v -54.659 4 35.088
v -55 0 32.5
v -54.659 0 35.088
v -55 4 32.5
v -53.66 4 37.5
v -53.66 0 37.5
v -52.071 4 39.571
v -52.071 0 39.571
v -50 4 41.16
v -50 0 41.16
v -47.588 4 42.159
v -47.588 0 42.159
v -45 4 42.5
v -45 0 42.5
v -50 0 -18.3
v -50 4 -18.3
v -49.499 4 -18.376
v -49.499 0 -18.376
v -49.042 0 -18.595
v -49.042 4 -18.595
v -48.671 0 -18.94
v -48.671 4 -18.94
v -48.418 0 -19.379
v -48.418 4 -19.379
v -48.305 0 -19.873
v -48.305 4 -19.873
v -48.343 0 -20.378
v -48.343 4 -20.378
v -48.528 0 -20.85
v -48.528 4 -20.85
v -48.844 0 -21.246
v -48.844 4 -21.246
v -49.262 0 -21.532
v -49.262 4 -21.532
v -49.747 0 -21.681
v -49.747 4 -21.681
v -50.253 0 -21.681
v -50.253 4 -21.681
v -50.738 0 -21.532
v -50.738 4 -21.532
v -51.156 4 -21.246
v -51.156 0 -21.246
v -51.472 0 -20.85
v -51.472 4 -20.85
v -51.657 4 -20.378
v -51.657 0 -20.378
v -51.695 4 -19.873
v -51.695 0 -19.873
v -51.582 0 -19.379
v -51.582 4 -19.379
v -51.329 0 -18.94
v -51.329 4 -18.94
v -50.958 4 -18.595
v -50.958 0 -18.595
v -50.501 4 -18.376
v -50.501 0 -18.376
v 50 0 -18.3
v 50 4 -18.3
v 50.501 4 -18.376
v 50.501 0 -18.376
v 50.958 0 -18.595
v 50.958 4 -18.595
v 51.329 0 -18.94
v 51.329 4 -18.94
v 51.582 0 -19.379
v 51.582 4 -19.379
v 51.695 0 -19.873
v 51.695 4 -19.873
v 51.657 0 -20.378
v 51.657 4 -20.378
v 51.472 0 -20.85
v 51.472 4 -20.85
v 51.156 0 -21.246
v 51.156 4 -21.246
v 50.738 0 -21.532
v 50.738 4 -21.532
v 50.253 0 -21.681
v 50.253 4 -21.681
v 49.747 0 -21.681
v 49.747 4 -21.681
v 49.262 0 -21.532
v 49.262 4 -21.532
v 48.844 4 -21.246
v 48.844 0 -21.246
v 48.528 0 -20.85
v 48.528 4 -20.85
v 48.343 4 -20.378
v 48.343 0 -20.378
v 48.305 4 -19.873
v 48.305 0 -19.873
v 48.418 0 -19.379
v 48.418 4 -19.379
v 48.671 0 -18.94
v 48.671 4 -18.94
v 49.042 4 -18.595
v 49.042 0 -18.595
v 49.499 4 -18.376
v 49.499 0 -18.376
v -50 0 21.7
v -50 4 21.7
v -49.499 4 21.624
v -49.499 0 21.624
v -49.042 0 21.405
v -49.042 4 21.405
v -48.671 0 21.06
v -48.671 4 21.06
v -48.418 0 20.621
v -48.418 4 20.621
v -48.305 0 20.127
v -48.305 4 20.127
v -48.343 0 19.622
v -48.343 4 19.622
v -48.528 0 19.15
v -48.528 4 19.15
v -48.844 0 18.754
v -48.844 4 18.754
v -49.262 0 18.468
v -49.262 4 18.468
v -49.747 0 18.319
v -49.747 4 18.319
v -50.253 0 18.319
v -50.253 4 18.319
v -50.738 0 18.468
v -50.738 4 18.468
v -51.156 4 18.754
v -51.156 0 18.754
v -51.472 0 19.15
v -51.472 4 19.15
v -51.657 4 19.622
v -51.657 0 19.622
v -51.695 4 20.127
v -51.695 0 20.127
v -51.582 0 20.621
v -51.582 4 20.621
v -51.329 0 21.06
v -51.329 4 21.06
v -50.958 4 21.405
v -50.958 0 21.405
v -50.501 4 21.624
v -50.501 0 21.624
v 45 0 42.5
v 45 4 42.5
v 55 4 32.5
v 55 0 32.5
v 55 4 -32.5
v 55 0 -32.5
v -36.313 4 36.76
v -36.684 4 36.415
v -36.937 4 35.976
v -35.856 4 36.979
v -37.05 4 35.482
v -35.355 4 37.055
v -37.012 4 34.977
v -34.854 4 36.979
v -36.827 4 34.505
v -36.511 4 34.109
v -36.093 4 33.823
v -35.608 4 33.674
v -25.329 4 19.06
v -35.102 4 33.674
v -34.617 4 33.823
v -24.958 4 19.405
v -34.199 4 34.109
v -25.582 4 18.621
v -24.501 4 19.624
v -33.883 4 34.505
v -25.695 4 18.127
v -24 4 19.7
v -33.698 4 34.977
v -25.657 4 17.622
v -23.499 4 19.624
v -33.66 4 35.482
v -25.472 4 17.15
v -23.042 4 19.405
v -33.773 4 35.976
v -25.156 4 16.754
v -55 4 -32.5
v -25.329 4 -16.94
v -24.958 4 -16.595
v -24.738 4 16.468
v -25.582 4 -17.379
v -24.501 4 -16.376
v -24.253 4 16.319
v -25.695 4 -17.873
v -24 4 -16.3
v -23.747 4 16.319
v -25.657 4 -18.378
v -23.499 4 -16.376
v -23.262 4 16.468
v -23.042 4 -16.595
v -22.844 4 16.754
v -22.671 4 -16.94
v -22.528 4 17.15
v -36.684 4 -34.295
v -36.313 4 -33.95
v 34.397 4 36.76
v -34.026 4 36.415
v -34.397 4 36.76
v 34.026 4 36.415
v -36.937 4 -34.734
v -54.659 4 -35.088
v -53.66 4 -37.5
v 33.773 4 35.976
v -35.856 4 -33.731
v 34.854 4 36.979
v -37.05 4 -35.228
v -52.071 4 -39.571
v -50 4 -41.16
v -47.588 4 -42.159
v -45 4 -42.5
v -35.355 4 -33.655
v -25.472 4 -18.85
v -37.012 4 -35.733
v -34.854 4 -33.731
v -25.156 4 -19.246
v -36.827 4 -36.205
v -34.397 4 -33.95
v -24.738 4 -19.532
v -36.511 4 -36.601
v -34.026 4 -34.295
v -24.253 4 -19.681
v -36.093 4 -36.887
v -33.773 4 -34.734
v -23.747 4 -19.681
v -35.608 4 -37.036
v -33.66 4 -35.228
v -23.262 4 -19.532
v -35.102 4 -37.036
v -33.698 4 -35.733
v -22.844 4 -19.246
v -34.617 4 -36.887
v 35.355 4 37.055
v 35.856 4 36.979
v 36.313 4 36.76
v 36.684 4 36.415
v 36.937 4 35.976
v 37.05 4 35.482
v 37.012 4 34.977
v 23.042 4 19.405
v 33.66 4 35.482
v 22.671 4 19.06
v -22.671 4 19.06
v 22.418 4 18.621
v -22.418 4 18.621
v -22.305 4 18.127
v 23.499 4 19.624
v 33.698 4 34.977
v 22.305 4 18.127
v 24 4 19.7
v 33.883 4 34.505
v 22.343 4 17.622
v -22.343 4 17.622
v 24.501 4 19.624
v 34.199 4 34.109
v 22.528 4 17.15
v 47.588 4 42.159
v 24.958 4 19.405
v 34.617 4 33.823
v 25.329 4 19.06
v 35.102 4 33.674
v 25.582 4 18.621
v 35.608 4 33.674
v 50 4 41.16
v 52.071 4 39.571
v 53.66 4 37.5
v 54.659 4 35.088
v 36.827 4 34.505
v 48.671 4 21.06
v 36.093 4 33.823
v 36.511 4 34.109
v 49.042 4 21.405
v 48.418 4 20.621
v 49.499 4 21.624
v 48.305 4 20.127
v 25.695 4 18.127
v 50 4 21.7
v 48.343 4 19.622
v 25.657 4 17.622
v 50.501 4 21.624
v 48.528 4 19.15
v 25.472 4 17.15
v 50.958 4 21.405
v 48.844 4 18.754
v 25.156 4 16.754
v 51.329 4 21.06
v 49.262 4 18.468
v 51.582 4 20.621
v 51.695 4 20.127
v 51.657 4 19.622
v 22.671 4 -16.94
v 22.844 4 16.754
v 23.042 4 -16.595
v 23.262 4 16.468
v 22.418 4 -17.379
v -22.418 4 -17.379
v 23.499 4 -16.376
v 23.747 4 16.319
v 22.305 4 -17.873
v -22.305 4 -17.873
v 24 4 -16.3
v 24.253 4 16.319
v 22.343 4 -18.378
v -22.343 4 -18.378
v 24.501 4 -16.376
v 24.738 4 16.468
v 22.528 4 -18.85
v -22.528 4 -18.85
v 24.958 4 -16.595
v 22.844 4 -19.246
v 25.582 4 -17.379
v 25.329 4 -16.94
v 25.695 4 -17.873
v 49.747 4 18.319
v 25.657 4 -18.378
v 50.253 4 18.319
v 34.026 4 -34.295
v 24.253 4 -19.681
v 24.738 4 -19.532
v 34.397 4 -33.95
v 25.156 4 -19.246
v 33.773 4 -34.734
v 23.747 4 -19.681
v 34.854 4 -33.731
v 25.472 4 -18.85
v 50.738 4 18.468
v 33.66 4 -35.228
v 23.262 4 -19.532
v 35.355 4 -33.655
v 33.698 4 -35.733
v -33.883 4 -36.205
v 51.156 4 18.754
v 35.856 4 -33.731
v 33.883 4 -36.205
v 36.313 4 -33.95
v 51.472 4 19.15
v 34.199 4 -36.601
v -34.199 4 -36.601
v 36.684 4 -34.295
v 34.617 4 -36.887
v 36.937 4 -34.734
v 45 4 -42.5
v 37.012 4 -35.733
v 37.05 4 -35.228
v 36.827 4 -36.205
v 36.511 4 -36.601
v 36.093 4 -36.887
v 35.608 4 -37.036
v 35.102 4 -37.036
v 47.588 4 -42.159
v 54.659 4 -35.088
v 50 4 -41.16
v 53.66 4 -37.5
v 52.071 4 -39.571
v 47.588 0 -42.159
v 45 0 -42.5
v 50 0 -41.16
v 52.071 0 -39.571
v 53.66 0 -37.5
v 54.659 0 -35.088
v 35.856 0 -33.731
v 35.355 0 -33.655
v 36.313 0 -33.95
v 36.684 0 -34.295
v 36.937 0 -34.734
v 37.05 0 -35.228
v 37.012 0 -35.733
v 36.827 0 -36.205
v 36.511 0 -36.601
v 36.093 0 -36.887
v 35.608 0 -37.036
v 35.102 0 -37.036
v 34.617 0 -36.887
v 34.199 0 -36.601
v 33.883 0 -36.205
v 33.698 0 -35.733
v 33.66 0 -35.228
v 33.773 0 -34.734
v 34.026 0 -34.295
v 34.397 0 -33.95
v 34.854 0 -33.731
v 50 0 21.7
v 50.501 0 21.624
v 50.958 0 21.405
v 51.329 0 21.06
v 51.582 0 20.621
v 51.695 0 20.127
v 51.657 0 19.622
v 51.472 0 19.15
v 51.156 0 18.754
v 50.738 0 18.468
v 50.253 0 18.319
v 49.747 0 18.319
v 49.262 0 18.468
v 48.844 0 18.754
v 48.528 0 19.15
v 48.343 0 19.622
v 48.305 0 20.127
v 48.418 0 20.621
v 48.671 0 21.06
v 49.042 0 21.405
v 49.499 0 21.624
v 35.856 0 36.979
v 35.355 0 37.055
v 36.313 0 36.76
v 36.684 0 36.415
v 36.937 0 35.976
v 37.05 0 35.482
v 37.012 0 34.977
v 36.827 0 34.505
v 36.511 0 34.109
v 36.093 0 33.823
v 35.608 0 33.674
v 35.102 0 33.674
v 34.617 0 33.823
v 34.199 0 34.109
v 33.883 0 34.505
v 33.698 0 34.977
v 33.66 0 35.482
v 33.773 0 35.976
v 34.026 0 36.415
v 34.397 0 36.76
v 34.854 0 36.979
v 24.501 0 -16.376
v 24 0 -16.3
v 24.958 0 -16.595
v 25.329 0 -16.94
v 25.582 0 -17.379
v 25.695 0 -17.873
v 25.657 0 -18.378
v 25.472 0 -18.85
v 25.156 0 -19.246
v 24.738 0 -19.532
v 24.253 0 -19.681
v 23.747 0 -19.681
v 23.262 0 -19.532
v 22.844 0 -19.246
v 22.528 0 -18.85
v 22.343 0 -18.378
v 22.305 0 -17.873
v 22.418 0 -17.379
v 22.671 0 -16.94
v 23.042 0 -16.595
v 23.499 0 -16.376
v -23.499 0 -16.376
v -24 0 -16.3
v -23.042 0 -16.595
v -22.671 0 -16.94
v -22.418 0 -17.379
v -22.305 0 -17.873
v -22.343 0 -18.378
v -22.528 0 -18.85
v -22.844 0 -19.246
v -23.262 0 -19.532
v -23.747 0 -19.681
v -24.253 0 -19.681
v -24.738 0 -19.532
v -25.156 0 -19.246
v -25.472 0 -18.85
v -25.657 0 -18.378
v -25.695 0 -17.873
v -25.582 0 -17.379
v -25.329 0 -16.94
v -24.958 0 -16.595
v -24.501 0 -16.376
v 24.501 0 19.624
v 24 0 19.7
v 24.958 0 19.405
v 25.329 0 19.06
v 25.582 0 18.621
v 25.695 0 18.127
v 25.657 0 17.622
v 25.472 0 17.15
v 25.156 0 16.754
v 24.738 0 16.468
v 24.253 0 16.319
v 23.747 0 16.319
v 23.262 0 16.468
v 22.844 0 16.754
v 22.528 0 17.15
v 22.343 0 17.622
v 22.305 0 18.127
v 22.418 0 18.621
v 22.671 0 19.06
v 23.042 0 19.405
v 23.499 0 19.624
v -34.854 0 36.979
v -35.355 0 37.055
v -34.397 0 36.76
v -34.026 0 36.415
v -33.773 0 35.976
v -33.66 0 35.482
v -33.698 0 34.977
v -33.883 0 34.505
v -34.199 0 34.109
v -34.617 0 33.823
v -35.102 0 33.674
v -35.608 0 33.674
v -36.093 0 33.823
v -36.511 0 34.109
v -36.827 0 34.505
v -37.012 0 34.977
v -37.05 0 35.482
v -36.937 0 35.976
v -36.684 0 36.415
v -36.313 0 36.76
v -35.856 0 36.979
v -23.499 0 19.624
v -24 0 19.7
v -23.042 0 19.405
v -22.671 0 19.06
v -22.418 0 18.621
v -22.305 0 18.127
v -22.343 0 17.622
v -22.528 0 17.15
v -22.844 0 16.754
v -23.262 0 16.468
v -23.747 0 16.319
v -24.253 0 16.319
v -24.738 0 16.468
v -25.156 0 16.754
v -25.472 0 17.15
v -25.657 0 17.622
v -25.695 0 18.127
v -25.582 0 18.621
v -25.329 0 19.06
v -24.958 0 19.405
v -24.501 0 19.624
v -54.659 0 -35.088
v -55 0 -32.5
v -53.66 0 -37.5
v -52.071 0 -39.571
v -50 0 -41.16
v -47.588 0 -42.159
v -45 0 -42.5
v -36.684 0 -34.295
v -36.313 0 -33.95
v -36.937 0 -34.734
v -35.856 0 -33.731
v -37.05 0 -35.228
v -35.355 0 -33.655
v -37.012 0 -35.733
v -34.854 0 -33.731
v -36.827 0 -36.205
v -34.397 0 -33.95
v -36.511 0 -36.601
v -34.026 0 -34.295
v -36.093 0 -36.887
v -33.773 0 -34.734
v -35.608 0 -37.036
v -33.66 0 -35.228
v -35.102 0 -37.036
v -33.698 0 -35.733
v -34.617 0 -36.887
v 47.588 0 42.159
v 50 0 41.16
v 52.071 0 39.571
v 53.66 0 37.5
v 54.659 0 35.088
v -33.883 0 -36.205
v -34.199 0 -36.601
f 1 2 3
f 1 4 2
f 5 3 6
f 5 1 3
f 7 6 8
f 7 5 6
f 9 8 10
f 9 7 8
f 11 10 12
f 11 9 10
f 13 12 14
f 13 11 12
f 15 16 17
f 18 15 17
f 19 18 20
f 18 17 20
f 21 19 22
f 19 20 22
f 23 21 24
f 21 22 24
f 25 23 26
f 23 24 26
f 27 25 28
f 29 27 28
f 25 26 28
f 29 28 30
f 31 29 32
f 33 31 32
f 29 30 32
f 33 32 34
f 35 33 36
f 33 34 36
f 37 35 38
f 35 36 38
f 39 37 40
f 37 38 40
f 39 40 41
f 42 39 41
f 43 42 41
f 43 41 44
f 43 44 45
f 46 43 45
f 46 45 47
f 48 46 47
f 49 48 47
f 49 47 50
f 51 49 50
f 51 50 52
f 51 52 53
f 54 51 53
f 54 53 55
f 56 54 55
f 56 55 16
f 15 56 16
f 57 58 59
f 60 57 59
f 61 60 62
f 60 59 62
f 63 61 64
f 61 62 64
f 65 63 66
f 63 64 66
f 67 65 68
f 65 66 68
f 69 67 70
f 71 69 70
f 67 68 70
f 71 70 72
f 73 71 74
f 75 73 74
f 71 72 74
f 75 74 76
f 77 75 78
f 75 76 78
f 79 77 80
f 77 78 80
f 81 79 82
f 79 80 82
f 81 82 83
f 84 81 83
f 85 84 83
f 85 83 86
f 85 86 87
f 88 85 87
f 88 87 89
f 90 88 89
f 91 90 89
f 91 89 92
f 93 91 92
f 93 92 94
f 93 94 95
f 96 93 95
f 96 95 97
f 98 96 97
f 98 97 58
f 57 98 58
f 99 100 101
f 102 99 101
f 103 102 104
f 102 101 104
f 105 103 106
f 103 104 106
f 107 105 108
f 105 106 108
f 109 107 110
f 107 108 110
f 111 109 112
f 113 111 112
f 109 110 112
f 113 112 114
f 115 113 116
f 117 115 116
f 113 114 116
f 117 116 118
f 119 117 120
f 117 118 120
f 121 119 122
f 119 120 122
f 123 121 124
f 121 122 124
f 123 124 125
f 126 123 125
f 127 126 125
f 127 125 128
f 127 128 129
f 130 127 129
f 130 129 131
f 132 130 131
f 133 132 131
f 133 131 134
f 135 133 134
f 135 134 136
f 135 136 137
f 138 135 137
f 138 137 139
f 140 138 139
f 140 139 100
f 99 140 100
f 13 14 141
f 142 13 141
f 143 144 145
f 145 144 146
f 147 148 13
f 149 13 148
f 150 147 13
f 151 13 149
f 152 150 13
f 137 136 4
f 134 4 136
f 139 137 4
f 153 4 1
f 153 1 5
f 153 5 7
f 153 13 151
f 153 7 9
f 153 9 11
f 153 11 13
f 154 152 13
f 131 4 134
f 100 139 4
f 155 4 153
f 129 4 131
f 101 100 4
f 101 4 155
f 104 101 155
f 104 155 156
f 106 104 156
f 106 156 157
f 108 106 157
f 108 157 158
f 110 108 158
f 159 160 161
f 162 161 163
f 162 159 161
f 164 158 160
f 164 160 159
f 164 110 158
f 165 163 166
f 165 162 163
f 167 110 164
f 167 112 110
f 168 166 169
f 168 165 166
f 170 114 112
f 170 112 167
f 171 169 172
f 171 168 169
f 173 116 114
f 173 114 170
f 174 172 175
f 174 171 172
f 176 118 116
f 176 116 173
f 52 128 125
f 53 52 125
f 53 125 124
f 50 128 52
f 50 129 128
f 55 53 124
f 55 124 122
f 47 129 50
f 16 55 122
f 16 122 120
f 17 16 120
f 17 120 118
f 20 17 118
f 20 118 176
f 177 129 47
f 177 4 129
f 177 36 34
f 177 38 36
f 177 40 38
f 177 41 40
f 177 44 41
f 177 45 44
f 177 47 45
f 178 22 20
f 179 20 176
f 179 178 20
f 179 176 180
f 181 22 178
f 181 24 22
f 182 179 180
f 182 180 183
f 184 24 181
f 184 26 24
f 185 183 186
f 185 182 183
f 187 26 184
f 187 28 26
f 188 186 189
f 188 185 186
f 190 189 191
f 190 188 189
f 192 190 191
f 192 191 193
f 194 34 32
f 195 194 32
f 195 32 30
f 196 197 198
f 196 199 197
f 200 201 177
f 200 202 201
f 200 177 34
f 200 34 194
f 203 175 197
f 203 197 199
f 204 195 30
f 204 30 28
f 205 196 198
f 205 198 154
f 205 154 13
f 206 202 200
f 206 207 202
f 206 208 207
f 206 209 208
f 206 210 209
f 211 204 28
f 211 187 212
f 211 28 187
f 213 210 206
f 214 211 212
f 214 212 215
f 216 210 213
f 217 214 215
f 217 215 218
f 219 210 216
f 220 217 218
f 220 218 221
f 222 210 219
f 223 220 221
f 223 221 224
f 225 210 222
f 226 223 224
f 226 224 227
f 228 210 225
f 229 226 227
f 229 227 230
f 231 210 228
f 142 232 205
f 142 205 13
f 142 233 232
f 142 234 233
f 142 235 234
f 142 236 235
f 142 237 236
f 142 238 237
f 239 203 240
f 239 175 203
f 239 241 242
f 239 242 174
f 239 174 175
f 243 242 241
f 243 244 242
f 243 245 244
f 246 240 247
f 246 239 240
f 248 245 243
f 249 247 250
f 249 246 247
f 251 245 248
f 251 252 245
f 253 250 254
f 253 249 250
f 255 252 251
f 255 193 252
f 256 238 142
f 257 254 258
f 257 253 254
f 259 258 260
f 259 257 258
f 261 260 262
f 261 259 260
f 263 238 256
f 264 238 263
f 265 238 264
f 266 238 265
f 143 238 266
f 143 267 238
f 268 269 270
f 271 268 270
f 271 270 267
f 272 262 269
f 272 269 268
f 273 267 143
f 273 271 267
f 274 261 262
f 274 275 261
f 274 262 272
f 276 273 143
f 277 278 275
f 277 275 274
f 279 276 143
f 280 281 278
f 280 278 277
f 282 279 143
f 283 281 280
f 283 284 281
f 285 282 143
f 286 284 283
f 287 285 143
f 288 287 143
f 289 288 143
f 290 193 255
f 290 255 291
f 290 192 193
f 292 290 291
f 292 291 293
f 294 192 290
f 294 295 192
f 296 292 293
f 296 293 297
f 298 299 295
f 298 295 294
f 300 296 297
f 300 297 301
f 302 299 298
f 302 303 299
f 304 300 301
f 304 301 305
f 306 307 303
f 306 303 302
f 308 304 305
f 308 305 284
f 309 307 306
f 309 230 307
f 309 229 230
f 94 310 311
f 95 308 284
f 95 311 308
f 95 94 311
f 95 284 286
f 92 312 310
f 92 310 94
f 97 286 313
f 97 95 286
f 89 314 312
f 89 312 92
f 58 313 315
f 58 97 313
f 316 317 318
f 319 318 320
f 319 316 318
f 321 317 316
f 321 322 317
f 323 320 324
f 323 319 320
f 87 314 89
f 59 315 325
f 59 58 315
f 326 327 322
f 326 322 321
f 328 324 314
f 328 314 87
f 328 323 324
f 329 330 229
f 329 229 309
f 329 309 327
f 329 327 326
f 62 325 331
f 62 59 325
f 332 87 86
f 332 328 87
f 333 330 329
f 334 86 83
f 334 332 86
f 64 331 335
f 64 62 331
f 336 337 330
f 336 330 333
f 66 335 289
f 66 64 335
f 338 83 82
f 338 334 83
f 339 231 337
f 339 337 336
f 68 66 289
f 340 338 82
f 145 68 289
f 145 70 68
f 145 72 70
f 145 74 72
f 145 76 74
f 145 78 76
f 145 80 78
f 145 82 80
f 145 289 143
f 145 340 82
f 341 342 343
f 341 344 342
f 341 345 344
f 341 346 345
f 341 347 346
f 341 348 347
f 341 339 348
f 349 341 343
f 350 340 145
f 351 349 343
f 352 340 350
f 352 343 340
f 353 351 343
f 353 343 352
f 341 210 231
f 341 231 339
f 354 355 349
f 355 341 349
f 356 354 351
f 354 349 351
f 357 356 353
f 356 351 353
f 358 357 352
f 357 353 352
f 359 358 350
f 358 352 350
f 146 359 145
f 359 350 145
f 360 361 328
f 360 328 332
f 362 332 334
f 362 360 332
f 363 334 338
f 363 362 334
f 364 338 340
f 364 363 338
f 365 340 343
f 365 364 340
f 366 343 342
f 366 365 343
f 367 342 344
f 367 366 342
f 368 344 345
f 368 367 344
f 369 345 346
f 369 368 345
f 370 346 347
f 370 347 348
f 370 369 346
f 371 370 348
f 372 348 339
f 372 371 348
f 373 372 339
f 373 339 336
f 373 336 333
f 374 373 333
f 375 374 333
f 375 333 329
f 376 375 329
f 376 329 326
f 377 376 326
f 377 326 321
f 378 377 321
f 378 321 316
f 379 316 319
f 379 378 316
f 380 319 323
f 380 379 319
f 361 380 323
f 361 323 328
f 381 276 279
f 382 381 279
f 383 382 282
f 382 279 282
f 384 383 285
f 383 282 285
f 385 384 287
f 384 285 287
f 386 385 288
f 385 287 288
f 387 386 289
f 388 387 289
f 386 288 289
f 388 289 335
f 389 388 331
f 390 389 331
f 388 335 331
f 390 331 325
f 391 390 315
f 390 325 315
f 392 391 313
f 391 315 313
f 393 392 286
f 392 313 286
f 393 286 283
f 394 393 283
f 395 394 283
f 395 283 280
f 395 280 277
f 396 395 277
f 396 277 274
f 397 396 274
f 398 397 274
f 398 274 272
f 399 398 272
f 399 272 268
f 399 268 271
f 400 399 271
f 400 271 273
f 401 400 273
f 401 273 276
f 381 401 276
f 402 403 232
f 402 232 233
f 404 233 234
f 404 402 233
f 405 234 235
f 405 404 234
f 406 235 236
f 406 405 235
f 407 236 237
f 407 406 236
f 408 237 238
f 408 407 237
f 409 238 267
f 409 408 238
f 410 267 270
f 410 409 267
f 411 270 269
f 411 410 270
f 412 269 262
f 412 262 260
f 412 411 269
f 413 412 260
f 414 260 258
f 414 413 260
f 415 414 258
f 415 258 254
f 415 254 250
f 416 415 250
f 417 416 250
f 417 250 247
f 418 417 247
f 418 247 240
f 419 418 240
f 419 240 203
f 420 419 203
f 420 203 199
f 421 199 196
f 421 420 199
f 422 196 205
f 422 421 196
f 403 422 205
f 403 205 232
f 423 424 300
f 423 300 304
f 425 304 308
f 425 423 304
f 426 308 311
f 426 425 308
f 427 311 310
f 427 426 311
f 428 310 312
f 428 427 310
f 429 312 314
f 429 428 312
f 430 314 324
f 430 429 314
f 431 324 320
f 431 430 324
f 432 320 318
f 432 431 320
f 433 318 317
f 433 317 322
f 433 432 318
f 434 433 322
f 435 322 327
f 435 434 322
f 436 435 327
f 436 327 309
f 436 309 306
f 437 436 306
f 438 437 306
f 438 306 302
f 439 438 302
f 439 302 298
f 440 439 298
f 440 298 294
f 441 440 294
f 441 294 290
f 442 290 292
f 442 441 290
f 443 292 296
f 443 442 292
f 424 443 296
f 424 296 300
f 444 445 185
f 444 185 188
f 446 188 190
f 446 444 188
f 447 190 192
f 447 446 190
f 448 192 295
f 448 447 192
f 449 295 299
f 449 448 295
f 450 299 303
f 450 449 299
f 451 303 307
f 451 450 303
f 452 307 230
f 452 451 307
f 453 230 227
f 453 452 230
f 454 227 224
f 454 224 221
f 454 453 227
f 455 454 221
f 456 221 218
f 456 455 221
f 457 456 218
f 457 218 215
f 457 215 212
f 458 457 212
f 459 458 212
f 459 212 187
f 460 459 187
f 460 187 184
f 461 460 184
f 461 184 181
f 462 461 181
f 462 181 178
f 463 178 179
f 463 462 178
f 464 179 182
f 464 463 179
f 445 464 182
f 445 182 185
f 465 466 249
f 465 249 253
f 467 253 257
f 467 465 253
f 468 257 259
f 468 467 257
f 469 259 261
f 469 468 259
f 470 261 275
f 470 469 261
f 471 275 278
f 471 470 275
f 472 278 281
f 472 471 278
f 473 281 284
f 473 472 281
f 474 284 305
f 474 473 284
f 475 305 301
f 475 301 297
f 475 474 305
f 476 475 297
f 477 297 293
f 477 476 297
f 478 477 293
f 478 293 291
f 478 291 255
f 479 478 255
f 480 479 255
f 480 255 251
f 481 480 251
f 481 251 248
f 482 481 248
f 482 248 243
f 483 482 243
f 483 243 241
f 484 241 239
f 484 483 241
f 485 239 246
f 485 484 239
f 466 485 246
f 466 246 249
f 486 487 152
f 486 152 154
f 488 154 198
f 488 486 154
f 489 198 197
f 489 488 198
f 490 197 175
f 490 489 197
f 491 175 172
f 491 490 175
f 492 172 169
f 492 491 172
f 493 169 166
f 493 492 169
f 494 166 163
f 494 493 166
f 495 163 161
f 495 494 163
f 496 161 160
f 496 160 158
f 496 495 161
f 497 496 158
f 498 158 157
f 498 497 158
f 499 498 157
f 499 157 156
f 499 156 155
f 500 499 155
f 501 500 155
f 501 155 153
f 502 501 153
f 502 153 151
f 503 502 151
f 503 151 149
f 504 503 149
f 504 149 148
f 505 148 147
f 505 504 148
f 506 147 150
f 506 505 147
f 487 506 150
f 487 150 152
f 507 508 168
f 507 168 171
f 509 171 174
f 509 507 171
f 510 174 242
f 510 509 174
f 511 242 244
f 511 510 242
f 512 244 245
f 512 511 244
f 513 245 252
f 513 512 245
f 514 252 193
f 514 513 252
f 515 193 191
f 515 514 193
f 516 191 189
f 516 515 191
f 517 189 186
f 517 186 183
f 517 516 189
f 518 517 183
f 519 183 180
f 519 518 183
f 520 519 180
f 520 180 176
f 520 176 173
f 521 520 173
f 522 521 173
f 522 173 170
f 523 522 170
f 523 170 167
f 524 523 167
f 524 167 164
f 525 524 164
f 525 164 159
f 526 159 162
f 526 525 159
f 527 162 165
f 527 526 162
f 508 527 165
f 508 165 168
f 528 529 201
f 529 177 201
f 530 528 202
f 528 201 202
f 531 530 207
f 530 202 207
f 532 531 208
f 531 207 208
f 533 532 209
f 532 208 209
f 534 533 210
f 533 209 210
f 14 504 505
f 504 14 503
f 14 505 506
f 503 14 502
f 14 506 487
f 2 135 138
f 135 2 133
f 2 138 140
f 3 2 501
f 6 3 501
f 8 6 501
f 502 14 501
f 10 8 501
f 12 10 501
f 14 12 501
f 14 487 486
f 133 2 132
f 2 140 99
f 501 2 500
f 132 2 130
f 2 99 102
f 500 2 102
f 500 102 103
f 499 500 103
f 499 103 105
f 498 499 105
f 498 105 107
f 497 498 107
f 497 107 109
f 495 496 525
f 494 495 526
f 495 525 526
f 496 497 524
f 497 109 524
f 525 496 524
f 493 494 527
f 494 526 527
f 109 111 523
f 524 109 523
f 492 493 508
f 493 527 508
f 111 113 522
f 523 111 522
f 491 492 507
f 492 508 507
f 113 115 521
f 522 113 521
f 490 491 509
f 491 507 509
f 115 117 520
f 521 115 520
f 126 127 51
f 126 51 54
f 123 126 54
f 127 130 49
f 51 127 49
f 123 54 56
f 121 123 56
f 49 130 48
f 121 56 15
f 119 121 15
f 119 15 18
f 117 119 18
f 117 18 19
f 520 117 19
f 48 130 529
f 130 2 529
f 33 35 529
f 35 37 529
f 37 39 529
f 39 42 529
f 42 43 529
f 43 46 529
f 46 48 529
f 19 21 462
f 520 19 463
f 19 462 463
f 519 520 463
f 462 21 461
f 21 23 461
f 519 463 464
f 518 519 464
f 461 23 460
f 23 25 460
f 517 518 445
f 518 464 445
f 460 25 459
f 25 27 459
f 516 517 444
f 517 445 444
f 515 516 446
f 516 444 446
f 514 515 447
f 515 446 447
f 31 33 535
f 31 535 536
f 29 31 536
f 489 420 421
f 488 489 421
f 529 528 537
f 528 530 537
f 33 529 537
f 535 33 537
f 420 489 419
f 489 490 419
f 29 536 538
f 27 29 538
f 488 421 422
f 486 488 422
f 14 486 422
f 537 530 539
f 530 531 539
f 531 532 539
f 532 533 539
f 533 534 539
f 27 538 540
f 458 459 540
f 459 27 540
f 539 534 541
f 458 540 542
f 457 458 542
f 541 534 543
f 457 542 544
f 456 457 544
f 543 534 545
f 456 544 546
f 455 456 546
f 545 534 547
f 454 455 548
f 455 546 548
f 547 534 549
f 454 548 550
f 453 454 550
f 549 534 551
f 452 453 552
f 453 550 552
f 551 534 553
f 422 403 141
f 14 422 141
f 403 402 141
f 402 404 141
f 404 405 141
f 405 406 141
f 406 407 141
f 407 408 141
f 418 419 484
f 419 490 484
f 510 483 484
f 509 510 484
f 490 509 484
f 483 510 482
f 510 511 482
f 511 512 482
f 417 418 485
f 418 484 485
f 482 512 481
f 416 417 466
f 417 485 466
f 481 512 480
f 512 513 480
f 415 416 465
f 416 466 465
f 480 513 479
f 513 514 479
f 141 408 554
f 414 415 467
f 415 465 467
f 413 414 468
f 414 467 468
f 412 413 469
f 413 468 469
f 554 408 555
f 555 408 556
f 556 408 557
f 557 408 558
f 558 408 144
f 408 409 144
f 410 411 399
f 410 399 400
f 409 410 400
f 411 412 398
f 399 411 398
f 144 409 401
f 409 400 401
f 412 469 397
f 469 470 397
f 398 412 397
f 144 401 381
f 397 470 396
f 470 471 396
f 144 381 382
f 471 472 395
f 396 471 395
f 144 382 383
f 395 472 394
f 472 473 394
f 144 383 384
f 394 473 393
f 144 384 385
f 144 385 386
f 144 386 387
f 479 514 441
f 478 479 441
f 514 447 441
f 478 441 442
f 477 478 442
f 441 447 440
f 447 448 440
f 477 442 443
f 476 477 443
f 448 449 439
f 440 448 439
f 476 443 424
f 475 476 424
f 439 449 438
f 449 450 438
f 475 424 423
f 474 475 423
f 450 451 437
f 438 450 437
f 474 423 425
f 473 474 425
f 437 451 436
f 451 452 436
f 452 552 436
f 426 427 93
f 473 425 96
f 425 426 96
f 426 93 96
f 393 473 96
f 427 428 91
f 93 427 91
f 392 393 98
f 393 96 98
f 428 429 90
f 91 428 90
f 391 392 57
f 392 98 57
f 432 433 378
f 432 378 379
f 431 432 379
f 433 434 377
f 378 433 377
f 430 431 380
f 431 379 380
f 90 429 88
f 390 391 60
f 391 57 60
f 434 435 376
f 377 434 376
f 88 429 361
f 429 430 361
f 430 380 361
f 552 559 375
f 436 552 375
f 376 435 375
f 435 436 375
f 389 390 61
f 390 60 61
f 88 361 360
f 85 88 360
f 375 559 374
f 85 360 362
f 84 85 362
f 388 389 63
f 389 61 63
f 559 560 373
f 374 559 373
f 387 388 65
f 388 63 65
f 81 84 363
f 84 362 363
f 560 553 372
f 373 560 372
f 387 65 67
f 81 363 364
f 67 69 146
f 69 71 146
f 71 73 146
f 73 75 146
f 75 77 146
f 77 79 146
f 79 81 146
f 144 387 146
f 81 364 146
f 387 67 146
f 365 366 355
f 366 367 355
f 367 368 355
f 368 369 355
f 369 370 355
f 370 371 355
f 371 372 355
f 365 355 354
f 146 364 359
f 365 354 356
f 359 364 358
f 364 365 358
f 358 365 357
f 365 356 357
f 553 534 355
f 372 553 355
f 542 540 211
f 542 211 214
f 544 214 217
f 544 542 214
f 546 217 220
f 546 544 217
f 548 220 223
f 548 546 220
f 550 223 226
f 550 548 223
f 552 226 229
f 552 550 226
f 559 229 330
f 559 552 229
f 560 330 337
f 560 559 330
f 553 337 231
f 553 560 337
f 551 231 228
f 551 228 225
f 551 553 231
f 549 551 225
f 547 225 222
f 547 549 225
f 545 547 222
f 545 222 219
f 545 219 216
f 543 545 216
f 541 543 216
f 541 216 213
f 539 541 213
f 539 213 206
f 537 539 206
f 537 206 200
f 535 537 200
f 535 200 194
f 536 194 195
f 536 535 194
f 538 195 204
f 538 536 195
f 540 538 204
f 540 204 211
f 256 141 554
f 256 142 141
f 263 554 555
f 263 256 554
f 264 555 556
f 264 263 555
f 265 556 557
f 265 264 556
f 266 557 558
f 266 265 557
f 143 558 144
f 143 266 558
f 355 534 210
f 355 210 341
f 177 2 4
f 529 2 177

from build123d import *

# Parameters (mm, degrees)
SKETCH_1_W          = 110
SKETCH_1_H          = 85
SKETCH_1_R          = 1.7
EXTRUDE_1_DEPTH     = 4
SKETCH_2_R          = 1.7
CUT_EXTRUDE_1_DEPTH = 10
FILLET_1_R          = 10


with BuildPart() as part:
    # 草图1 → 凸台-拉伸1 (new body)
    with BuildSketch(Plane(origin=(0, 0, 0), x_dir=(1, 0, 0), z_dir=(0, 1, 0))):
        Rectangle(SKETCH_1_W, SKETCH_1_H)
        with Locations(Location((24, 18, 0), (0, 0, 270))):
            Circle(SKETCH_1_R, mode=Mode.SUBTRACT)
        with Locations(Location((-24, 18, 0), (0, 0, 270))):
            Circle(SKETCH_1_R, mode=Mode.SUBTRACT)
        with Locations(Location((-24, -18, 0), (0, 0, 270))):
            Circle(SKETCH_1_R, mode=Mode.SUBTRACT)
        with Locations(Location((24, -18, 0), (0, 0, 270))):
            Circle(SKETCH_1_R, mode=Mode.SUBTRACT)
        with Locations(Location((-35.355, 35.355, 0), (0, 0, 270))):
            Circle(SKETCH_1_R, mode=Mode.SUBTRACT)
        with Locations(Location((35.355, 35.355, 0), (0, 0, 270))):
            Circle(SKETCH_1_R, mode=Mode.SUBTRACT)
        with Locations(Location((35.355, -35.355, 0), (0, 0, 270))):
            Circle(SKETCH_1_R, mode=Mode.SUBTRACT)
        with Locations(Location((-35.355, -35.355, 0), (0, 0, 270))):
            Circle(SKETCH_1_R, mode=Mode.SUBTRACT)
    extrude(amount=EXTRUDE_1_DEPTH)

    # 草图2 → 切除-拉伸1 (cut)
    with BuildSketch(Plane(origin=(0, 4, 0), x_dir=(1, 0, 0), z_dir=(0, 1, 0))):
        with Locations(Location((50, 20, 0), (0, 0, 270))):
            Circle(SKETCH_2_R)
        with Locations(Location((50, -20, 0), (0, 0, 270))):
            Circle(SKETCH_2_R)
        with Locations(Location((-50, 20, 0), (0, 0, 270))):
            Circle(SKETCH_2_R)
        with Locations(Location((-50, -20, 0), (0, 0, 270))):
            Circle(SKETCH_2_R)
    extrude(amount=-CUT_EXTRUDE_1_DEPTH, mode=Mode.SUBTRACT)

    # 圆角1
    fillet_1_edges = [part.edges().sort_by_distance(p)[0] for p in [
        (55, 2, 42.5),
        (-55, 2, 42.5),
        (-55, 2, -42.5),
        (55, 2, -42.5),
    ]]
    fillet(fillet_1_edges, radius=FILLET_1_R)


solid = part.part
